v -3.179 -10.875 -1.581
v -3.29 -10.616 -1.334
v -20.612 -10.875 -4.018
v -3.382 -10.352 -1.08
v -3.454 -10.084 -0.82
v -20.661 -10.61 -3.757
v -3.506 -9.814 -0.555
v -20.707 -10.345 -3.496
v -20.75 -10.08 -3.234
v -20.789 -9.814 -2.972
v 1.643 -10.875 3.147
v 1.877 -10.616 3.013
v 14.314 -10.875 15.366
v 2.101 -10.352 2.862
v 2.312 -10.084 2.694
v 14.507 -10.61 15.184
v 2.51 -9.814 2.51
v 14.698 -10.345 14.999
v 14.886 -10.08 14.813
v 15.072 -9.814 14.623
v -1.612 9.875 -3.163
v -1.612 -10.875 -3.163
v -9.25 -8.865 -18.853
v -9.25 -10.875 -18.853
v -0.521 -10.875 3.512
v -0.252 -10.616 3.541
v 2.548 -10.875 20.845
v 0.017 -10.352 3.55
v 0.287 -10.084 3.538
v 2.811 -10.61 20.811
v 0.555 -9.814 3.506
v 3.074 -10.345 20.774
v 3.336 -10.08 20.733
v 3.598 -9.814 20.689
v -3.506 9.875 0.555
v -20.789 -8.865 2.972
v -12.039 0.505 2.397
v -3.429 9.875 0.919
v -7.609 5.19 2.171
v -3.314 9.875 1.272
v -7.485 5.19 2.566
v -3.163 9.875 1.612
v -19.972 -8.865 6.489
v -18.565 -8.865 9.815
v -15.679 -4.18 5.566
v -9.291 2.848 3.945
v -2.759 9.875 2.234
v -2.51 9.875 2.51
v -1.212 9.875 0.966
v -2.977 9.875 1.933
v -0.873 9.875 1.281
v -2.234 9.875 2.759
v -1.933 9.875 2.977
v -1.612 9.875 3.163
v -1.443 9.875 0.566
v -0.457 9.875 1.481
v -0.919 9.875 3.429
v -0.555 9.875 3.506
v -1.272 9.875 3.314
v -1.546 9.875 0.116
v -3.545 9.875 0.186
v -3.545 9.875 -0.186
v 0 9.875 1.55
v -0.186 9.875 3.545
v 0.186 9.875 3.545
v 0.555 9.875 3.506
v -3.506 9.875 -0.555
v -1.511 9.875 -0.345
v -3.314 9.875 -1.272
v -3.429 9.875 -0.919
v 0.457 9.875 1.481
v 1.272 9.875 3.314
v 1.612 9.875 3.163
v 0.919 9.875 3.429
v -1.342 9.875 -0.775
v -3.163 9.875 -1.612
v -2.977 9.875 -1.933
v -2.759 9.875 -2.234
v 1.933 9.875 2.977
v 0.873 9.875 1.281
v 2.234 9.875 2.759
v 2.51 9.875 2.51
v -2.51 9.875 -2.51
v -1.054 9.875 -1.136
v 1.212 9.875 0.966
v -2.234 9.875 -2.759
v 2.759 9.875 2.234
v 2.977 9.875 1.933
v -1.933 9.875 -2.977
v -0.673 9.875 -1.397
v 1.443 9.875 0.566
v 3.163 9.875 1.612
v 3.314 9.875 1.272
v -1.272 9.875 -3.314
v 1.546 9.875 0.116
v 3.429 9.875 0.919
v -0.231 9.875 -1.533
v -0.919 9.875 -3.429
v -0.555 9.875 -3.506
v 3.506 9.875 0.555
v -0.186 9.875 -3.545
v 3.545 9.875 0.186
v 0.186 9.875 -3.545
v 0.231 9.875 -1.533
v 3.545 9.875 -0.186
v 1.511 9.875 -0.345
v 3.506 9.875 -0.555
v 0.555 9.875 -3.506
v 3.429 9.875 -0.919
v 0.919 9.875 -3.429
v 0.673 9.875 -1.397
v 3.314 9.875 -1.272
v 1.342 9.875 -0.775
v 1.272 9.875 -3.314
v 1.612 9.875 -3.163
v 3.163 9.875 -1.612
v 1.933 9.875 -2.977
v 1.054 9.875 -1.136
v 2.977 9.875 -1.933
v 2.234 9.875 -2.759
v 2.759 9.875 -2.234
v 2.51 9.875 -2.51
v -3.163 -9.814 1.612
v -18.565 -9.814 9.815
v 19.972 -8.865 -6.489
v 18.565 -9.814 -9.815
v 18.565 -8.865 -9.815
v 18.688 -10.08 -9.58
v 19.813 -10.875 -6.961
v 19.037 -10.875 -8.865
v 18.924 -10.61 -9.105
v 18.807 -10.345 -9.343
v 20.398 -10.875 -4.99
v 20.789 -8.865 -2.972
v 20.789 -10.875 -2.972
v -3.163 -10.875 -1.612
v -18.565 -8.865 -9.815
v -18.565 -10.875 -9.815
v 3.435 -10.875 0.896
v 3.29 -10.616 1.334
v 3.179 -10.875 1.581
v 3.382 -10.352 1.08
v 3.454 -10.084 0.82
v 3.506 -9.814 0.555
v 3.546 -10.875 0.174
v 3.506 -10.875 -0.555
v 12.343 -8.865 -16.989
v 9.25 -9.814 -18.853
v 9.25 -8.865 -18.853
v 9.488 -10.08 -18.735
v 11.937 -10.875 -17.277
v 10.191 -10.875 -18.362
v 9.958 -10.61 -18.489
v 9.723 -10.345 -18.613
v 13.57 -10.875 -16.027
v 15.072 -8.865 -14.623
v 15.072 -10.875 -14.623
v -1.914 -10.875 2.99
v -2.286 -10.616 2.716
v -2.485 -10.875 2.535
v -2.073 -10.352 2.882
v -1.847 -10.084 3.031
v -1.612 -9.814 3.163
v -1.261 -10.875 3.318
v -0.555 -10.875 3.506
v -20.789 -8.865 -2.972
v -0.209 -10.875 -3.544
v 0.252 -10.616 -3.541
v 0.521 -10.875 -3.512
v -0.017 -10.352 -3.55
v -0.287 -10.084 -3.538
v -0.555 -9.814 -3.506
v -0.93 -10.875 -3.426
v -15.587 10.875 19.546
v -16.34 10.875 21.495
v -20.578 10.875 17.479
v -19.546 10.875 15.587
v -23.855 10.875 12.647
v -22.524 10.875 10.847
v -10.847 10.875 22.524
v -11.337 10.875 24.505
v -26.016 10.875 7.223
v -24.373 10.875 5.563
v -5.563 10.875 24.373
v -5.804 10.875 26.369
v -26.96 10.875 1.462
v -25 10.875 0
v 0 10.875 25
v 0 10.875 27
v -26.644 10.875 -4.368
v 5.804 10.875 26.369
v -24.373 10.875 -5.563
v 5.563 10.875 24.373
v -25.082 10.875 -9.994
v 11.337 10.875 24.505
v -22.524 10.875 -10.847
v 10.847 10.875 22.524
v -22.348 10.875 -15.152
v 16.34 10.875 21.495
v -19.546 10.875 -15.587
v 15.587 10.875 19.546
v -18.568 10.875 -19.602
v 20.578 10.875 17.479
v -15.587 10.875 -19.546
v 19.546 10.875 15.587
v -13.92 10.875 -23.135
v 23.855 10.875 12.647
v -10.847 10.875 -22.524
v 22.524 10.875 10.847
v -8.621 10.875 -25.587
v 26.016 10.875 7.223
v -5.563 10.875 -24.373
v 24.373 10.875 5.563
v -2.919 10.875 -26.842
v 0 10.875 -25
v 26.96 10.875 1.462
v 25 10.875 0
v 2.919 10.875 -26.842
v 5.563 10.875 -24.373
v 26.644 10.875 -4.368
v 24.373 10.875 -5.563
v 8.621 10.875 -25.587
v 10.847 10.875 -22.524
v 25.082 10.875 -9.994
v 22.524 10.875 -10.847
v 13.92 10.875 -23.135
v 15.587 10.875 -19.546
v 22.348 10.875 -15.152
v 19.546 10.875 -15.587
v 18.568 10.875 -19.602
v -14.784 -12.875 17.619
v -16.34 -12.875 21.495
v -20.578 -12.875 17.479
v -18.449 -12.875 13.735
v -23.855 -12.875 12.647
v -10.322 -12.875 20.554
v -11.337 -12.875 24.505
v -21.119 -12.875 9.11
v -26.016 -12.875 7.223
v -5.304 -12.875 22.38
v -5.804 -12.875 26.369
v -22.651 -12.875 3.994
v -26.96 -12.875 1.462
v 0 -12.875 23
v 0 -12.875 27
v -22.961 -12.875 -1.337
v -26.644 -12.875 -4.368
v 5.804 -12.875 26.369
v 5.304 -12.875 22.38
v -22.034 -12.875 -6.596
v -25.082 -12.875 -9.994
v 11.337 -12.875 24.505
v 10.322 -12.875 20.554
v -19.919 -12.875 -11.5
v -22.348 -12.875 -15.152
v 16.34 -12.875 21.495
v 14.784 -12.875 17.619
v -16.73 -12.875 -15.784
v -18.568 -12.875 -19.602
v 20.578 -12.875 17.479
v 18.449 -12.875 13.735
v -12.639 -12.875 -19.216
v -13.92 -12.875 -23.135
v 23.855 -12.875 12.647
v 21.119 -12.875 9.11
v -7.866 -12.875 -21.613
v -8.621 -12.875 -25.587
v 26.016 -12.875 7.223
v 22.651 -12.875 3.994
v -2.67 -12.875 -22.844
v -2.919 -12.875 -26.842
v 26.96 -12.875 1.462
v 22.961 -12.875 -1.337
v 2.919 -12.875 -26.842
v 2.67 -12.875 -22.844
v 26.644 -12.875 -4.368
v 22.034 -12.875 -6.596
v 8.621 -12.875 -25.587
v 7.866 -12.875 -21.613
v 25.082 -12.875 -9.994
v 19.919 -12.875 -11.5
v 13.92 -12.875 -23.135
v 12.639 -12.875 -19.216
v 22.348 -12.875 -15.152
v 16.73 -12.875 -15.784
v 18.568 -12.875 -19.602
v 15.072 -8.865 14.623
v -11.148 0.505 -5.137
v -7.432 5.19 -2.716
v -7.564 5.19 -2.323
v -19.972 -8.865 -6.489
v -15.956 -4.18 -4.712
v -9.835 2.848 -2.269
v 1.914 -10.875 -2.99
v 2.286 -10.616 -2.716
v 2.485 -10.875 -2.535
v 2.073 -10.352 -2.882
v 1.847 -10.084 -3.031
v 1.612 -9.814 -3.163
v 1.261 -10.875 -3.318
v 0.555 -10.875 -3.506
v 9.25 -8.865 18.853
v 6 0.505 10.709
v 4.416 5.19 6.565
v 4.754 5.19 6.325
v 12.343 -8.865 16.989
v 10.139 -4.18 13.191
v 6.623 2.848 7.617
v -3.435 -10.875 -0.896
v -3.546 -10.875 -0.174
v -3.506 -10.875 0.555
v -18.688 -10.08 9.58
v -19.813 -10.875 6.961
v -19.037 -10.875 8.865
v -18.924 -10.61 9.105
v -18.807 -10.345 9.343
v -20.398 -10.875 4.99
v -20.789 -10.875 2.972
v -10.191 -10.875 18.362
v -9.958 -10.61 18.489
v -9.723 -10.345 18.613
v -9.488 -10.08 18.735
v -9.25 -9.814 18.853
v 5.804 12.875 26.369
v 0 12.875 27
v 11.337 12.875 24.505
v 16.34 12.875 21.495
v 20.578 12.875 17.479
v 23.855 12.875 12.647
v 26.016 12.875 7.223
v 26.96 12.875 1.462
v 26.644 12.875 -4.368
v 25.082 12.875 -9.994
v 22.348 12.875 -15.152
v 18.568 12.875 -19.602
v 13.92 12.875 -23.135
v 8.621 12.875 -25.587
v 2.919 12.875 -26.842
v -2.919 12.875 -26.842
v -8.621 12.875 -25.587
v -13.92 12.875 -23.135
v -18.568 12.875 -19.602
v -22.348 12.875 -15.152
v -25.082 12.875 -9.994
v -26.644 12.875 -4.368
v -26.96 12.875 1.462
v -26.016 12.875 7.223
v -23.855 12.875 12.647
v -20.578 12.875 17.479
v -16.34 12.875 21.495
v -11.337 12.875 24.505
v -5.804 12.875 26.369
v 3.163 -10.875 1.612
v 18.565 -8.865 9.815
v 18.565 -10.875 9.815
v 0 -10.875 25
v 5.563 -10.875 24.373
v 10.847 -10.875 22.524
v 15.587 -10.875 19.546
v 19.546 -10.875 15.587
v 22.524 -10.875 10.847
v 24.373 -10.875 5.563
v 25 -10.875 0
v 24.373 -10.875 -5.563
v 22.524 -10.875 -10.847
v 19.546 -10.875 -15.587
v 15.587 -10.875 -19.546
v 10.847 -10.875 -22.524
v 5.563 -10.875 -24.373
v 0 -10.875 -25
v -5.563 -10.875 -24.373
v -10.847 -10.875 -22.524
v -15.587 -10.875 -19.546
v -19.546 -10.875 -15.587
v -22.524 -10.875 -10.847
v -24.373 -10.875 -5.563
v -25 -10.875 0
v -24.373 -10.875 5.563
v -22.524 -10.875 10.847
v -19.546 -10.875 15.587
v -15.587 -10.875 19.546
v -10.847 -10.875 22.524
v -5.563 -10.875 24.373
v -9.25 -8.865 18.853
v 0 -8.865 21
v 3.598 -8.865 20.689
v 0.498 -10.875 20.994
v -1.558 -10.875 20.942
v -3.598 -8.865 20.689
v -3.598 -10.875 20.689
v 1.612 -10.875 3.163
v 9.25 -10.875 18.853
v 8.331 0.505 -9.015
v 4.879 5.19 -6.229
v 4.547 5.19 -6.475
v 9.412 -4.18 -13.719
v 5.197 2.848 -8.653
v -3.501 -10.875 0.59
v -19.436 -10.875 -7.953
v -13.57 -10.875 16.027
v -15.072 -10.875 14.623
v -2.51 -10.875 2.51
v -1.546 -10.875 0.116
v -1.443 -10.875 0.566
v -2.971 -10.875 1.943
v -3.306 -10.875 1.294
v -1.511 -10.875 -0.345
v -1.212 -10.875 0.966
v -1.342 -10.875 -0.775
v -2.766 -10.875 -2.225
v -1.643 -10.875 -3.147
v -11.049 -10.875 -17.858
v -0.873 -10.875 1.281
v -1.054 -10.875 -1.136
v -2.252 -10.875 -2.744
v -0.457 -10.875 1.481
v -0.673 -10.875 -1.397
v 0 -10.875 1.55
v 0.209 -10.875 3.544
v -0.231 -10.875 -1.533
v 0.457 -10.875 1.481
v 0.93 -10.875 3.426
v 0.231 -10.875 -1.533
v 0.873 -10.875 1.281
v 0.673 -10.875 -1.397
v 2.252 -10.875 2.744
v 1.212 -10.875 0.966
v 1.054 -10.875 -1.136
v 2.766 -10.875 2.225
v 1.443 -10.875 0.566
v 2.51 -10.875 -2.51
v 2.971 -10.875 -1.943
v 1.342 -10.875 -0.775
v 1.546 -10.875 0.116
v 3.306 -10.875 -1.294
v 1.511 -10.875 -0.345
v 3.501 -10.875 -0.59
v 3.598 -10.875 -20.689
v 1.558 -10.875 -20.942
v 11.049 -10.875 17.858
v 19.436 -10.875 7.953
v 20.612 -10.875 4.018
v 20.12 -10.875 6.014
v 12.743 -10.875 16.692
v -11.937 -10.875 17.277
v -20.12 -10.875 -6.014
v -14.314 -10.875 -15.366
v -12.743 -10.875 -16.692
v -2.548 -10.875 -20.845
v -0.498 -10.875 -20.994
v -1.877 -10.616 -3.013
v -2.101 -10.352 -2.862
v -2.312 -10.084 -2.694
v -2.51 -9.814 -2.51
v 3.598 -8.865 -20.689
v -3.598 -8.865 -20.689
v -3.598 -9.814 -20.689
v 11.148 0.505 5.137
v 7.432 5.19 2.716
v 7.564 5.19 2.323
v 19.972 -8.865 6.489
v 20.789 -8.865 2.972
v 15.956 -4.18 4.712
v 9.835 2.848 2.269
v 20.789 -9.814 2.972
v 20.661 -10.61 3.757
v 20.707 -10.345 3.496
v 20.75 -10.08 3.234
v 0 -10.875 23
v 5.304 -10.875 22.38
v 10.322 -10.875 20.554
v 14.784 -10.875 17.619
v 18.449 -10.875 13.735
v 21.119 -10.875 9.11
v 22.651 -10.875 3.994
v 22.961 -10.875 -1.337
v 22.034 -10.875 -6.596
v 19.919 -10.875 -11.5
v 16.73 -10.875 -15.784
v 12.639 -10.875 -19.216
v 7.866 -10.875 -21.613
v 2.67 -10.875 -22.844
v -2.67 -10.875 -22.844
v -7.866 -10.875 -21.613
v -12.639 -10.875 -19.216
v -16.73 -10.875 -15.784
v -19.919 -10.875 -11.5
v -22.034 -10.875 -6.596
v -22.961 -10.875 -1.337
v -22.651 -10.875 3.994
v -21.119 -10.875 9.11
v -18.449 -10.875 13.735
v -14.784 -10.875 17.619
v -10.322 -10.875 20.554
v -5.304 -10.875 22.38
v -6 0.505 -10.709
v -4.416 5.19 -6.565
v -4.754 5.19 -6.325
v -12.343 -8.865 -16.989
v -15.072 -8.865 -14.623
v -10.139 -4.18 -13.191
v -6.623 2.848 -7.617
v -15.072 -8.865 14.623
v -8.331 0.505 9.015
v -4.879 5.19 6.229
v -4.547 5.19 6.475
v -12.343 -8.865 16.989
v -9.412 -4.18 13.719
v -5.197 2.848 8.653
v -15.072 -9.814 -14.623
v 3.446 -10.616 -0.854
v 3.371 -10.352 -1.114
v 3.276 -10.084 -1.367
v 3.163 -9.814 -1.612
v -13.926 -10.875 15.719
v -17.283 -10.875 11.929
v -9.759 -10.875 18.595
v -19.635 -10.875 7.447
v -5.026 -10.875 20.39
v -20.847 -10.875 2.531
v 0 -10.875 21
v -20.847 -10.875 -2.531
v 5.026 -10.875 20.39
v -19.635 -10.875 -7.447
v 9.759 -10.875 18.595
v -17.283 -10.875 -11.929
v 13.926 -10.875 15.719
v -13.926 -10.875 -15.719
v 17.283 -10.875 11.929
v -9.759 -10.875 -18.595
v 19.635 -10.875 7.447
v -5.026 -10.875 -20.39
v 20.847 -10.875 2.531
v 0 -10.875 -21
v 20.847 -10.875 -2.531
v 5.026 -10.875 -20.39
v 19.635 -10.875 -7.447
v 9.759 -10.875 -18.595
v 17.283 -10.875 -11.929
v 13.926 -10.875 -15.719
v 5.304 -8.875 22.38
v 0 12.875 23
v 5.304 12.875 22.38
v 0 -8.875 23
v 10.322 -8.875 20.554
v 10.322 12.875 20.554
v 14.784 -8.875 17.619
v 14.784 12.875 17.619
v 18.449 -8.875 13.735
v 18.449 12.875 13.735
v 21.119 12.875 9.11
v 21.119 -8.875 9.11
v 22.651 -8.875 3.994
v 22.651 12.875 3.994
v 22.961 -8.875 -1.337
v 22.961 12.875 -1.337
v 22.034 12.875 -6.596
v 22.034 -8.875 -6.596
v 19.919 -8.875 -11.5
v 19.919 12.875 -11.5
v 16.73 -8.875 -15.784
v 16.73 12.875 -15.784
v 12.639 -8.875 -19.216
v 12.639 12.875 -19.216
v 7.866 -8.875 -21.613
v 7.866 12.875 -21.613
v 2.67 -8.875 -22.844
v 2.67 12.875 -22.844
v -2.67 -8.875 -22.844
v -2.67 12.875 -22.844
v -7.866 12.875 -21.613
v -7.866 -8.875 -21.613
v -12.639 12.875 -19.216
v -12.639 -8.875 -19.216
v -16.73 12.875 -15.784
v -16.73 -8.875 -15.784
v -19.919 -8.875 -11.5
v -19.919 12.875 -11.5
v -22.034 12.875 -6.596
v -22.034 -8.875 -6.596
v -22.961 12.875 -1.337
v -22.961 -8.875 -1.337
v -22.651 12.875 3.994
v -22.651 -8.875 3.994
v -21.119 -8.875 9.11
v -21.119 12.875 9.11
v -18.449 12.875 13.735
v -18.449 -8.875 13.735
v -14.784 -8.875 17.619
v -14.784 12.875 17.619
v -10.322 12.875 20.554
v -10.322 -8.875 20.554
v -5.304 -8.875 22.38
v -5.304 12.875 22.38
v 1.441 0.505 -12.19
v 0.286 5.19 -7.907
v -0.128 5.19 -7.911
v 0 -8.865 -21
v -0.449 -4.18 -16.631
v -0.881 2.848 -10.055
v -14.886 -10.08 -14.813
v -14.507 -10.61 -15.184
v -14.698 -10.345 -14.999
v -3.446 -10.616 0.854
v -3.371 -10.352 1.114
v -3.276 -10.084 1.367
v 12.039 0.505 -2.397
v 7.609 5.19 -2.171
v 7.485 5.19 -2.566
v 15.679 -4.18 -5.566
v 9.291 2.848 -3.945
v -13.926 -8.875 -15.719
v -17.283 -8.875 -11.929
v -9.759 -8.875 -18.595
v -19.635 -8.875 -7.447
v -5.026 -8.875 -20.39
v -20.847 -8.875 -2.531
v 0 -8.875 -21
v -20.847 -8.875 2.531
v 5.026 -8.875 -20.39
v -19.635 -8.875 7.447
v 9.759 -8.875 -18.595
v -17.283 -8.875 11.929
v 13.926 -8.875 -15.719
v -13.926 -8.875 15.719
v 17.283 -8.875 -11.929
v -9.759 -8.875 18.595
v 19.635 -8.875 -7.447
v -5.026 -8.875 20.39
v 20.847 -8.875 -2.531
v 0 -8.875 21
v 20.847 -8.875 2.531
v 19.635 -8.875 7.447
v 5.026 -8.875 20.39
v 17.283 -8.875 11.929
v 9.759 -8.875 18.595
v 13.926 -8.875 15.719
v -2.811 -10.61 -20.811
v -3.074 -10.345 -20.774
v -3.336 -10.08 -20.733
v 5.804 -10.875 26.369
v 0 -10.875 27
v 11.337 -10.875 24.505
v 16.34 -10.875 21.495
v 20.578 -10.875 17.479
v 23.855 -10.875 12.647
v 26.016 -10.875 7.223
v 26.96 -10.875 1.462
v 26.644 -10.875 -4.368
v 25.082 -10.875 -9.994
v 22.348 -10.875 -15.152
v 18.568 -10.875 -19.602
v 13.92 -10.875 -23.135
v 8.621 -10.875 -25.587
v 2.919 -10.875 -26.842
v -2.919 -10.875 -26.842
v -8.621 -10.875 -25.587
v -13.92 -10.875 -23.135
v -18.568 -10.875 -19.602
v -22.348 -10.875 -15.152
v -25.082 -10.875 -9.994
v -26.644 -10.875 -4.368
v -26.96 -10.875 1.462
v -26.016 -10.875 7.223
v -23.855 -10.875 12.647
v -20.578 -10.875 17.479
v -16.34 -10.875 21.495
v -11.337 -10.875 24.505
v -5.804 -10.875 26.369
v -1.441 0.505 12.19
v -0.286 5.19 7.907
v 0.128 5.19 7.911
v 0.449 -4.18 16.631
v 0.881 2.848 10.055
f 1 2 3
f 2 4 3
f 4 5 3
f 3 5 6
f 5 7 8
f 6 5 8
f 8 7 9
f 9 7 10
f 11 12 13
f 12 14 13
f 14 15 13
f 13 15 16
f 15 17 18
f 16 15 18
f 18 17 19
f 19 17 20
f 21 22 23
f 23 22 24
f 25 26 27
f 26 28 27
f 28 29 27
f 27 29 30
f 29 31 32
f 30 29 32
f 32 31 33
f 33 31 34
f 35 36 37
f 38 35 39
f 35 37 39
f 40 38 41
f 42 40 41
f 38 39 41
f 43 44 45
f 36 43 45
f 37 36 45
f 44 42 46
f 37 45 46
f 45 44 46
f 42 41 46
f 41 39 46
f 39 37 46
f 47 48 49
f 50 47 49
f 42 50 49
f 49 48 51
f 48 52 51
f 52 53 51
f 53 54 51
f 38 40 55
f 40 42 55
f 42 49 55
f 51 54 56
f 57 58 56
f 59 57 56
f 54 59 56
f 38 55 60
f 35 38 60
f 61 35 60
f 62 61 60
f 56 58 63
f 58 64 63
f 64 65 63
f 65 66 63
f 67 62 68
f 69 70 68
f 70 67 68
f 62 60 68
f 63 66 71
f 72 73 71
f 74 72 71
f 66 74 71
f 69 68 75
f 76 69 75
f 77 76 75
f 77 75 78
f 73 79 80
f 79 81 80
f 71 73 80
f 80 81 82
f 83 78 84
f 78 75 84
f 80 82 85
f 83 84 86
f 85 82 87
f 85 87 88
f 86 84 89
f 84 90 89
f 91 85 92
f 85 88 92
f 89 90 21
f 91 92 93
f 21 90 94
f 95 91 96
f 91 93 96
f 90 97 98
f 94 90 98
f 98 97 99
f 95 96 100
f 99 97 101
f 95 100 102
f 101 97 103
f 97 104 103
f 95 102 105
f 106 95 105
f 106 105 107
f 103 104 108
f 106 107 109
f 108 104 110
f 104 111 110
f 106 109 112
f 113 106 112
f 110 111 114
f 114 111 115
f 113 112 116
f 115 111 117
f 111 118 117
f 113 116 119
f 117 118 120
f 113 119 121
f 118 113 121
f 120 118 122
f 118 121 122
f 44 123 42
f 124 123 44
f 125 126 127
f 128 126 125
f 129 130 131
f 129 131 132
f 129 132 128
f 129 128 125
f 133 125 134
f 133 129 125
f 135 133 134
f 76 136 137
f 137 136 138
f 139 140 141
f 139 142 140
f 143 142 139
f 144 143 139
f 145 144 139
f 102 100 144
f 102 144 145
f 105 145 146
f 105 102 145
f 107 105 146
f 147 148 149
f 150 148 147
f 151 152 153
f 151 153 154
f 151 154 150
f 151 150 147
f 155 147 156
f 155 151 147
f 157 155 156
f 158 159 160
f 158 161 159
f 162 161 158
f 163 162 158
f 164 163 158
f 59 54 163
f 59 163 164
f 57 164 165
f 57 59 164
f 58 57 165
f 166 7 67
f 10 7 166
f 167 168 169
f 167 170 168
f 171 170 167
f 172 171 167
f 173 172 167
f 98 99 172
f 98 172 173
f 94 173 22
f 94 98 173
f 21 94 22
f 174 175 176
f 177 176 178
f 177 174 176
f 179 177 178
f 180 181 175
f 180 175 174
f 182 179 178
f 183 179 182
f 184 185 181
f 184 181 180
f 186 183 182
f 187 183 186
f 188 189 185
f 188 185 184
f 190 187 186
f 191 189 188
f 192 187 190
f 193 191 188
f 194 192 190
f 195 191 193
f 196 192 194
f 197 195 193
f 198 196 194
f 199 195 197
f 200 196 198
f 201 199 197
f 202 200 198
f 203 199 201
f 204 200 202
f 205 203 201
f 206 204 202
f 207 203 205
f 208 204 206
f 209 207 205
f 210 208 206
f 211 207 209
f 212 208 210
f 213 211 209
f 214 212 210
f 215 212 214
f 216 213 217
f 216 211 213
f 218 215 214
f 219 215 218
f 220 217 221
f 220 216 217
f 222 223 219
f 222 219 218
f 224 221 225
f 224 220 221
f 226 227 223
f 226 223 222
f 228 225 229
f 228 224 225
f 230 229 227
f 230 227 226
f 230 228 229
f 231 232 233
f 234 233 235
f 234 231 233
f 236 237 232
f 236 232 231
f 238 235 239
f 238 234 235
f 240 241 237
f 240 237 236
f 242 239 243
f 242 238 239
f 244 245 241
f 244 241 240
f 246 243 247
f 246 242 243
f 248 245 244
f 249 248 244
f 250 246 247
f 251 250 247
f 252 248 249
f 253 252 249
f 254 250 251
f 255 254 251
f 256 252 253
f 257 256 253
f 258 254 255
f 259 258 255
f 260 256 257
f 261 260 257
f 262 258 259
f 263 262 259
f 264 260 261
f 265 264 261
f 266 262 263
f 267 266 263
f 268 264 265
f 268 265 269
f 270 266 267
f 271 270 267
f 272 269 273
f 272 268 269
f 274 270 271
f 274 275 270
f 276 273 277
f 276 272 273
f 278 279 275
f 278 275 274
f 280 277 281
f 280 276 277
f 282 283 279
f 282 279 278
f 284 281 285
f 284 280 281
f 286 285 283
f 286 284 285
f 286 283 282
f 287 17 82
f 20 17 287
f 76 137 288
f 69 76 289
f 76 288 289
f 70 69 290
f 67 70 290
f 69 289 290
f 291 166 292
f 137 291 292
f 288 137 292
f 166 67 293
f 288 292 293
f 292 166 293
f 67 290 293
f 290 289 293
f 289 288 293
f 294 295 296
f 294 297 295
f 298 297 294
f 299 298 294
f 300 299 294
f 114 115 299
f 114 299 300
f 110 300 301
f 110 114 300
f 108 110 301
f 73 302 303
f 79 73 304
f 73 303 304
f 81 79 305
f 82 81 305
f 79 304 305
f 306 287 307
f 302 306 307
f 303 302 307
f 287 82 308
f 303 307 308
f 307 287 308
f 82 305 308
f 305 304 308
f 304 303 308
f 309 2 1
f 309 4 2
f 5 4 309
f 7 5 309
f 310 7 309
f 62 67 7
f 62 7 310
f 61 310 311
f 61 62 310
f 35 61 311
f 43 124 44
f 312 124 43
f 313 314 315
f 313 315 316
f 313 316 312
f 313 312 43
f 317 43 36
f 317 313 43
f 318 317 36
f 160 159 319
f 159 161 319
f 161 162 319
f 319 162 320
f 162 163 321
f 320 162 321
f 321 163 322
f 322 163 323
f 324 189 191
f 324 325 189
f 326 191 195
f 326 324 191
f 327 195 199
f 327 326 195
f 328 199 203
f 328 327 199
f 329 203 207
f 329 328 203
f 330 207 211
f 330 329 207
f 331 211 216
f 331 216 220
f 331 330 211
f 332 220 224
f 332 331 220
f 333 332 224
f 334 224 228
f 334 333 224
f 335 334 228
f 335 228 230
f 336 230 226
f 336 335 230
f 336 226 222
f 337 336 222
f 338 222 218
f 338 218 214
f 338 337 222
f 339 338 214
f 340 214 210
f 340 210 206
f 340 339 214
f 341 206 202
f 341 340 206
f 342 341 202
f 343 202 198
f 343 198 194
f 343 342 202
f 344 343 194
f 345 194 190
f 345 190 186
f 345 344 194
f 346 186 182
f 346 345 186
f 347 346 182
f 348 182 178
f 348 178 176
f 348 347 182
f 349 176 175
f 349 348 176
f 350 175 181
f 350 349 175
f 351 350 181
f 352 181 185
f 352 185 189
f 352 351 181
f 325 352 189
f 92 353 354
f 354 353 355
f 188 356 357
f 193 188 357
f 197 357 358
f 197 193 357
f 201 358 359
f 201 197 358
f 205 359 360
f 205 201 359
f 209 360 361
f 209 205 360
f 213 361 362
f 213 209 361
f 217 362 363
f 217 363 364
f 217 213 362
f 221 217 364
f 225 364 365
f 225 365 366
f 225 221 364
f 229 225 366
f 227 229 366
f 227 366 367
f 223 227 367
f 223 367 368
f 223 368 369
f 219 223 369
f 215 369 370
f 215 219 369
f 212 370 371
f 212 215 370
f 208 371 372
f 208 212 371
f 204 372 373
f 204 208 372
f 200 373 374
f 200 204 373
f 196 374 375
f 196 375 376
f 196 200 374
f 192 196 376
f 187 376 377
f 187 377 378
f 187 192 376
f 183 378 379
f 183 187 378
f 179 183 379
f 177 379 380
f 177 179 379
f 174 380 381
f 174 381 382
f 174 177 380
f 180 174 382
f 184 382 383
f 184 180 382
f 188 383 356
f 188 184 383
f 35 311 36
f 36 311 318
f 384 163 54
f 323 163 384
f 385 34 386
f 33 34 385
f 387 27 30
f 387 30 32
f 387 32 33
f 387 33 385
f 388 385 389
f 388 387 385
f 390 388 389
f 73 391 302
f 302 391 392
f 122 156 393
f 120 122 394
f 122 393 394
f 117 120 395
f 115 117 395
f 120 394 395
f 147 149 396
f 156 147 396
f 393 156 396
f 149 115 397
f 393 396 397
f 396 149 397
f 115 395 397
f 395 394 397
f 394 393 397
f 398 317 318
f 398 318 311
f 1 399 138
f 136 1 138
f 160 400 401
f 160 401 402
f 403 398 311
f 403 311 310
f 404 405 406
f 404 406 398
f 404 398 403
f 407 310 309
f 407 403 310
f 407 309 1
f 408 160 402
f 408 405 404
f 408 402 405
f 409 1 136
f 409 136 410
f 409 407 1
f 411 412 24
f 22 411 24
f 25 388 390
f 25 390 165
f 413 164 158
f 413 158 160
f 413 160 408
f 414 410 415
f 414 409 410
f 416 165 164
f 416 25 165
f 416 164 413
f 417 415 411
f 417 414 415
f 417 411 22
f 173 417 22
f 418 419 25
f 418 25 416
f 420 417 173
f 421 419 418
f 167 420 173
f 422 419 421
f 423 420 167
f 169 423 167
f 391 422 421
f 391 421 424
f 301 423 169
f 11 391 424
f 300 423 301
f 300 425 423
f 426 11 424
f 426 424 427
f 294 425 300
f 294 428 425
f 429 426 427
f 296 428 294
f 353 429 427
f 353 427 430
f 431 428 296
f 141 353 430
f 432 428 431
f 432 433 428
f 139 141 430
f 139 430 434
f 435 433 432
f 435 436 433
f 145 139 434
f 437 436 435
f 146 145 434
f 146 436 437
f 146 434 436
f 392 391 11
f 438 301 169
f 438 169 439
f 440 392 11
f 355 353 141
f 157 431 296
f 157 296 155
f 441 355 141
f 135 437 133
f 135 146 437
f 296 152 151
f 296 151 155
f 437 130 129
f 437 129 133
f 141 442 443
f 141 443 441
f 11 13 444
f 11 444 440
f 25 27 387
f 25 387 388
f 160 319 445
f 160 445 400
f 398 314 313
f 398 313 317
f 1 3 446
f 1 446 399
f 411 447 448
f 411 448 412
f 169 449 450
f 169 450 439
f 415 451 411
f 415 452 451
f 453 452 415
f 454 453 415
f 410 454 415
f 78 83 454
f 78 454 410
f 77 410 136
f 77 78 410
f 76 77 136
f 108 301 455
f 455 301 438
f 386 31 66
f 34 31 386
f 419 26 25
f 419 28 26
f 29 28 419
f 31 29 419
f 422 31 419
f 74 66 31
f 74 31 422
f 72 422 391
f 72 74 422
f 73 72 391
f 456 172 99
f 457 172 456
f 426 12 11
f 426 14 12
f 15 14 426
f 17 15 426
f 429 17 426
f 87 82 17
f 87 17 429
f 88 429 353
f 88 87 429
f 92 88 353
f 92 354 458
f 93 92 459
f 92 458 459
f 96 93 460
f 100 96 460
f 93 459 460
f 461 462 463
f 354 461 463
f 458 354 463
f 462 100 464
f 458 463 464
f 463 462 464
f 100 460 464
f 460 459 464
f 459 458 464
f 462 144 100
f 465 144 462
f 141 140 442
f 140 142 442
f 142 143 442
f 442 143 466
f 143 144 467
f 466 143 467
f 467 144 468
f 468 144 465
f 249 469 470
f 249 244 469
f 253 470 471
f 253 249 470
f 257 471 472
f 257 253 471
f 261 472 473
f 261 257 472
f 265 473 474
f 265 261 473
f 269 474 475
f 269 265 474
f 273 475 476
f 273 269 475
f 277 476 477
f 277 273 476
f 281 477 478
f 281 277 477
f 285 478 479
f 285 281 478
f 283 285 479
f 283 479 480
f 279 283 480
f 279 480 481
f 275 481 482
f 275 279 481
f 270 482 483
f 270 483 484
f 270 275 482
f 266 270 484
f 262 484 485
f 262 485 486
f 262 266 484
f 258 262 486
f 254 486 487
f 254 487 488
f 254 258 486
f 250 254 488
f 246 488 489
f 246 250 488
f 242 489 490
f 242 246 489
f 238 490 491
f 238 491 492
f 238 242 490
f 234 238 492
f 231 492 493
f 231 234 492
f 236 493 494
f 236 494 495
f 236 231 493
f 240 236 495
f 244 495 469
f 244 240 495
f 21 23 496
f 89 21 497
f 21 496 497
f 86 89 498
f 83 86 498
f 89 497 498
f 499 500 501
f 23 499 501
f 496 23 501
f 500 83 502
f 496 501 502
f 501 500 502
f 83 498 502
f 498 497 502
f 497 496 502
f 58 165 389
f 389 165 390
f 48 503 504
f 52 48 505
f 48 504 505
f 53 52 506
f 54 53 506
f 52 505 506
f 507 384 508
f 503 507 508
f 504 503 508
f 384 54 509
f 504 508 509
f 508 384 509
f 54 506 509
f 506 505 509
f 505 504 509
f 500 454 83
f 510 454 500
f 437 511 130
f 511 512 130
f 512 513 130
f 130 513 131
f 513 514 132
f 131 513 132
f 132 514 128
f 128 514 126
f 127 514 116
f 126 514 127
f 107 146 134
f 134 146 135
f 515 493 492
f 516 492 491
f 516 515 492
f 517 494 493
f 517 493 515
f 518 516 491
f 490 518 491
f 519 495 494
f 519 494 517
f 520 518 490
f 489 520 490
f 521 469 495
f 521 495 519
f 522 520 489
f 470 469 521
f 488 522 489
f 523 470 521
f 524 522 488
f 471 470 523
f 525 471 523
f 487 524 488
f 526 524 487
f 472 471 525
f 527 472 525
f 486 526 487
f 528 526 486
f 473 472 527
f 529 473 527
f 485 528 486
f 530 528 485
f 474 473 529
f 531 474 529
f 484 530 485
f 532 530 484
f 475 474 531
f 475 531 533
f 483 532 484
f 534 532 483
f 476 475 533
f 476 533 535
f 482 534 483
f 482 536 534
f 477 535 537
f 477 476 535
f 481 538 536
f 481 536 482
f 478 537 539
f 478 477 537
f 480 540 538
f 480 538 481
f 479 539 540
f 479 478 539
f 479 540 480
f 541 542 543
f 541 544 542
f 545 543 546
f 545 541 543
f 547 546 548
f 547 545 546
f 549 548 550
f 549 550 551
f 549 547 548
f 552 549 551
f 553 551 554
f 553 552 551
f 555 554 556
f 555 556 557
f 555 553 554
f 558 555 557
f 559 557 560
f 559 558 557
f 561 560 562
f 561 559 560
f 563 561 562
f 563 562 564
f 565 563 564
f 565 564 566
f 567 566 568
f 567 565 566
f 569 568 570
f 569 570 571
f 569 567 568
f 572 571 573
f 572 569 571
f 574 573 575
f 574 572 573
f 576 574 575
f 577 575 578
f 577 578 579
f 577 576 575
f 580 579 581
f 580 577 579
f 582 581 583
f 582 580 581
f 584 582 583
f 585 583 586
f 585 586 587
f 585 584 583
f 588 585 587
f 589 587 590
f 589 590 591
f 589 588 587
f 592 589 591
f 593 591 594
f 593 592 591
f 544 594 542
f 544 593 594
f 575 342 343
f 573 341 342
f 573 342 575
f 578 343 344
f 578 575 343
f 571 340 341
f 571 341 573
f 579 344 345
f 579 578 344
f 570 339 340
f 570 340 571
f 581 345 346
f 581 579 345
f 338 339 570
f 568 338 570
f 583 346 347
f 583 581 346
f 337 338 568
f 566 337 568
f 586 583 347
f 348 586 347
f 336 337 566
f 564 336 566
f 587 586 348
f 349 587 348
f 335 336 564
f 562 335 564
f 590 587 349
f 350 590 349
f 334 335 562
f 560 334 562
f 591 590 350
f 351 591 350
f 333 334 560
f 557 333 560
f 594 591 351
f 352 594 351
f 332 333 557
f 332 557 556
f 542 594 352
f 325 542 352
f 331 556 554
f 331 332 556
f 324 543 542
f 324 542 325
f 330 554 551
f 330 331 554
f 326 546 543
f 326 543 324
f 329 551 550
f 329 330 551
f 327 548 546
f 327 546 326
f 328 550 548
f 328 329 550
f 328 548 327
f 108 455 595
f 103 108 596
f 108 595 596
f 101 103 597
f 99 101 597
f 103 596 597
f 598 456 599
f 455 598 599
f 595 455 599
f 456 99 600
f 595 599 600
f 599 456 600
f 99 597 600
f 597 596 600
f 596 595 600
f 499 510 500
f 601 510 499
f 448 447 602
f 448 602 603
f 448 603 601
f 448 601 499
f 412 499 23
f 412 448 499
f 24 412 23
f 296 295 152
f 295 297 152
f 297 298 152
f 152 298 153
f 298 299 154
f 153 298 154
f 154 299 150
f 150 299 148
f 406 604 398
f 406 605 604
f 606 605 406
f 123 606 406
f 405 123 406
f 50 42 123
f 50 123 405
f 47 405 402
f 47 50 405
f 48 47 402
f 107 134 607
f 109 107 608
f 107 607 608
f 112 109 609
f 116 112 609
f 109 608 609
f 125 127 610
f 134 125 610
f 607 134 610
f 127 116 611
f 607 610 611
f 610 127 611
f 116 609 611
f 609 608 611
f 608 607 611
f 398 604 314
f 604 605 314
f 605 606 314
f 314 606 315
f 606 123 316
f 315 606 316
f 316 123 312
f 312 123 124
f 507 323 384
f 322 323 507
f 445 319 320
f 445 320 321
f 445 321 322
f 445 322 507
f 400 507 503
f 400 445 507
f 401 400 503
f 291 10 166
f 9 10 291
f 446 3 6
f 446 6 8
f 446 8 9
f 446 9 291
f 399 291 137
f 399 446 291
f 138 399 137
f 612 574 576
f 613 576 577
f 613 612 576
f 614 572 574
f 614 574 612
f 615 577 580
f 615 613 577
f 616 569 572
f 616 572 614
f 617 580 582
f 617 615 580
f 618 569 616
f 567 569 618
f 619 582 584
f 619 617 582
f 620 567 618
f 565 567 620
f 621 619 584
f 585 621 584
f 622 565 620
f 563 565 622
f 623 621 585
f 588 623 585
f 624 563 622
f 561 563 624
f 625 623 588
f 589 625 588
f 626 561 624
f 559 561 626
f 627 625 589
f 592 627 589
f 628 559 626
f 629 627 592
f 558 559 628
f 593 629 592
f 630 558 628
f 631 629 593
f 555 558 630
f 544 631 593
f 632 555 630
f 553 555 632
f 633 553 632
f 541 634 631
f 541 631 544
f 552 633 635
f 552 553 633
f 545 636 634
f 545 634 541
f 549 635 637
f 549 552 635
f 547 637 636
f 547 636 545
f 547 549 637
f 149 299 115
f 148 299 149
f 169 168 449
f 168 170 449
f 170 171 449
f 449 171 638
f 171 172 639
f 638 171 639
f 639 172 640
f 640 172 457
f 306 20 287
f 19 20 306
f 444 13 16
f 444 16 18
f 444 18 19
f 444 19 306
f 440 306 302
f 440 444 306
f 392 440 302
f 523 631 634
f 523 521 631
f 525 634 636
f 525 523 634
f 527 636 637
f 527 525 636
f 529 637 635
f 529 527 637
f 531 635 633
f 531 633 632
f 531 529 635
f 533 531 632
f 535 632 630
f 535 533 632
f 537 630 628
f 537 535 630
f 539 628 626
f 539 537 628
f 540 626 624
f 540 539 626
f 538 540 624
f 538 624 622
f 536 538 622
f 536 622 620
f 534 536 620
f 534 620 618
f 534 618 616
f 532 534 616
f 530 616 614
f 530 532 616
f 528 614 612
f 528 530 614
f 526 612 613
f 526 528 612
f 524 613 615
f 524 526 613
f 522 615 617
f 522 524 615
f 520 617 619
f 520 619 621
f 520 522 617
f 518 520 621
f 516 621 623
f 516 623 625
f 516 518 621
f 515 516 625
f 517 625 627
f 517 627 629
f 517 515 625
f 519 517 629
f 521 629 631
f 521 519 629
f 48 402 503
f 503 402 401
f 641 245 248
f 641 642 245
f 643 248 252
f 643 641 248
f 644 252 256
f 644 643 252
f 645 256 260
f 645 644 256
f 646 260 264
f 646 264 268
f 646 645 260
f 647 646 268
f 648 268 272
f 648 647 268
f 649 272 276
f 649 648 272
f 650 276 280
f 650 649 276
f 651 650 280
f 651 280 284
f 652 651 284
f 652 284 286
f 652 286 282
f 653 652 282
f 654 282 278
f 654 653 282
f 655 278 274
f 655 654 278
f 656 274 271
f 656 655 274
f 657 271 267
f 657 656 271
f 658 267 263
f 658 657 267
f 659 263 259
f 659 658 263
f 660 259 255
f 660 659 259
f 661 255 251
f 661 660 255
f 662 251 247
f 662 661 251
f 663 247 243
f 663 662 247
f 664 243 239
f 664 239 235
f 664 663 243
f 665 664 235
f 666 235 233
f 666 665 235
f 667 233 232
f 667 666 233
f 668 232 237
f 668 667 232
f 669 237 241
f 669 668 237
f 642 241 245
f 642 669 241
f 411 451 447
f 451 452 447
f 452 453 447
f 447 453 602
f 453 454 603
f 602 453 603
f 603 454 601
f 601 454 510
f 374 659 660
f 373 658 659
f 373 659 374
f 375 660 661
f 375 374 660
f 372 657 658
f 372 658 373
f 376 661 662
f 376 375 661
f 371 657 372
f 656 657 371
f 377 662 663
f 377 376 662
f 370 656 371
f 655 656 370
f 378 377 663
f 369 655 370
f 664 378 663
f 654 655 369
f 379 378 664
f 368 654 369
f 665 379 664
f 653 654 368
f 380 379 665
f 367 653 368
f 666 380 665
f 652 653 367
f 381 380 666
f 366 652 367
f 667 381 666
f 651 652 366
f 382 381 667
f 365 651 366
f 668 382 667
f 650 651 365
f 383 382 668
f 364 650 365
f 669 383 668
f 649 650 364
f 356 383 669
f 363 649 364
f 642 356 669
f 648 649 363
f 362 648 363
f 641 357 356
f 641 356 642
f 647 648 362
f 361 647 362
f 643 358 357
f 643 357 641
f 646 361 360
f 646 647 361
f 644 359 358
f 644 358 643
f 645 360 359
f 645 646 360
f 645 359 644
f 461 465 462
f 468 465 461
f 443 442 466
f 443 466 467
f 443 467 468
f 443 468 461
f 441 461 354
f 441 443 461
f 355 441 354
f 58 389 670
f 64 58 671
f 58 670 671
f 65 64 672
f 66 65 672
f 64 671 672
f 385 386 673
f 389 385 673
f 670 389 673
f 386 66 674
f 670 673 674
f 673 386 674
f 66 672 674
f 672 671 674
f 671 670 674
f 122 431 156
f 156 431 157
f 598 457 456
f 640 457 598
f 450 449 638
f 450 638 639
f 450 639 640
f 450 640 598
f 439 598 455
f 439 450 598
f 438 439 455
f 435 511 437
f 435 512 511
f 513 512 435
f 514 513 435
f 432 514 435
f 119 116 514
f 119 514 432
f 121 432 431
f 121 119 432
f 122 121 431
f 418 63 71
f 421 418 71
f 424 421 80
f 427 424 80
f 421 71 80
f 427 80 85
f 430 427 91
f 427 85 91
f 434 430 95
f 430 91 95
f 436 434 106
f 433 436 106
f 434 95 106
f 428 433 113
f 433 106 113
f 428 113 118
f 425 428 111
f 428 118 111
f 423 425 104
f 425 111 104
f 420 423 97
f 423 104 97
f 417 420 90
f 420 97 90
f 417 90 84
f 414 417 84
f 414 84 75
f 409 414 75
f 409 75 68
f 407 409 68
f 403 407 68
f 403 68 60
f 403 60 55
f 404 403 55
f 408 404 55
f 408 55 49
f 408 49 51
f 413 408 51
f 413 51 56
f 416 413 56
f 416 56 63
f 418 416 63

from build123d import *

# Parameters (mm, degrees)
SKETCH002_W        = 20.75
SKETCH002_H        = 2
PAD_DEPTH          = 20.75
CHAMFER_SIZE       = 1.0606847018
POLARPATTERN_COUNT = 10


with BuildPart() as wheelrimbody:
    # Sketch → Revolution (revolve)
    with BuildSketch(Plane.YZ):
        Polygon((-10.875, 25.0000000006), (10.875, 25), (10.875, 27), (12.875, 27), (12.875, 23), (-8.875, 23), (-8.875, 21), (-10.875, 21), (-10.875, 23), (-12.875, 23), (-12.875, 27.0000000006), (-10.875, 27.0000000006), align=None)
    revolve(axis=Axis((0, 0, 0), (0, 1, 0)))


with BuildPart() as wheelaxleandspokesbody:
    # Sketch002 → Revolution001 (revolve)
    with BuildSketch(Plane.YZ):
        with Locations((-0.5, 2.55)):
            Rectangle(SKETCH002_W, SKETCH002_H)
    revolve(axis=Axis((0, 0, 0), (0, 1, 0)))

    # Sketch001 (on DatumPlane) → Pad (new body)
    with BuildSketch(Plane(origin=(0, -10.875, 0), x_dir=(0, 0, -1), z_dir=(0, -1, 0))):
        with BuildLine():
            ThreePointArc((20.689476759, -3.5979926959), (21, 0), (20.689476759, 3.5979926959))
            Line((3.5062936091, 0.5553423509), (20.689476759, 3.5979926959))
            ThreePointArc((3.5062936091, -0.5553423509), (3.55, 0), (3.5062936091, 0.5553423509))
            Line((3.5062936091, -0.5553423509), (20.689476759, -3.5979926959))
        make_face()
    extrude(amount=-PAD_DEPTH)

    # Sketch003 (on Local_CS) → Groove (revolve, cut)
    with BuildSketch(Plane(origin=(0.5553423509, 9.875, -3.5062936091), x_dir=(0.1743590483, 0, -0.9846821428), z_dir=(0.9846821428, 0, 0.1743590483))):
        Polygon((0, 0), (17.46, -18.75), (17.46, 0), align=None)
    revolve(axis=Axis((0, 0, 0), (0, 1, 0)), mode=Mode.SUBTRACT)

    # Chamfer
    chamfer_edges = [wheelaxleandspokesbody.edges().sort_by_distance(p)[0] for p in [
        (-2.076668, -10.875, -12.097885),
    ]]
    chamfer(chamfer_edges, length=CHAMFER_SIZE)

    # PolarPattern: WheelAxleAndSpokesBody ×10 about axis
    polarpattern_axis = Axis((0, 0, 0), (0, 1, 0))


with BuildPart() as wheelaxleandspokesbody_1:
    add(wheelaxleandspokesbody.part)
    for i in range(1, POLARPATTERN_COUNT):
        add(wheelaxleandspokesbody.part.rotate(polarpattern_axis, i * 360 / POLARPATTERN_COUNT))


solid = Compound([wheelrimbody.part, wheelaxleandspokesbody_1.part])
